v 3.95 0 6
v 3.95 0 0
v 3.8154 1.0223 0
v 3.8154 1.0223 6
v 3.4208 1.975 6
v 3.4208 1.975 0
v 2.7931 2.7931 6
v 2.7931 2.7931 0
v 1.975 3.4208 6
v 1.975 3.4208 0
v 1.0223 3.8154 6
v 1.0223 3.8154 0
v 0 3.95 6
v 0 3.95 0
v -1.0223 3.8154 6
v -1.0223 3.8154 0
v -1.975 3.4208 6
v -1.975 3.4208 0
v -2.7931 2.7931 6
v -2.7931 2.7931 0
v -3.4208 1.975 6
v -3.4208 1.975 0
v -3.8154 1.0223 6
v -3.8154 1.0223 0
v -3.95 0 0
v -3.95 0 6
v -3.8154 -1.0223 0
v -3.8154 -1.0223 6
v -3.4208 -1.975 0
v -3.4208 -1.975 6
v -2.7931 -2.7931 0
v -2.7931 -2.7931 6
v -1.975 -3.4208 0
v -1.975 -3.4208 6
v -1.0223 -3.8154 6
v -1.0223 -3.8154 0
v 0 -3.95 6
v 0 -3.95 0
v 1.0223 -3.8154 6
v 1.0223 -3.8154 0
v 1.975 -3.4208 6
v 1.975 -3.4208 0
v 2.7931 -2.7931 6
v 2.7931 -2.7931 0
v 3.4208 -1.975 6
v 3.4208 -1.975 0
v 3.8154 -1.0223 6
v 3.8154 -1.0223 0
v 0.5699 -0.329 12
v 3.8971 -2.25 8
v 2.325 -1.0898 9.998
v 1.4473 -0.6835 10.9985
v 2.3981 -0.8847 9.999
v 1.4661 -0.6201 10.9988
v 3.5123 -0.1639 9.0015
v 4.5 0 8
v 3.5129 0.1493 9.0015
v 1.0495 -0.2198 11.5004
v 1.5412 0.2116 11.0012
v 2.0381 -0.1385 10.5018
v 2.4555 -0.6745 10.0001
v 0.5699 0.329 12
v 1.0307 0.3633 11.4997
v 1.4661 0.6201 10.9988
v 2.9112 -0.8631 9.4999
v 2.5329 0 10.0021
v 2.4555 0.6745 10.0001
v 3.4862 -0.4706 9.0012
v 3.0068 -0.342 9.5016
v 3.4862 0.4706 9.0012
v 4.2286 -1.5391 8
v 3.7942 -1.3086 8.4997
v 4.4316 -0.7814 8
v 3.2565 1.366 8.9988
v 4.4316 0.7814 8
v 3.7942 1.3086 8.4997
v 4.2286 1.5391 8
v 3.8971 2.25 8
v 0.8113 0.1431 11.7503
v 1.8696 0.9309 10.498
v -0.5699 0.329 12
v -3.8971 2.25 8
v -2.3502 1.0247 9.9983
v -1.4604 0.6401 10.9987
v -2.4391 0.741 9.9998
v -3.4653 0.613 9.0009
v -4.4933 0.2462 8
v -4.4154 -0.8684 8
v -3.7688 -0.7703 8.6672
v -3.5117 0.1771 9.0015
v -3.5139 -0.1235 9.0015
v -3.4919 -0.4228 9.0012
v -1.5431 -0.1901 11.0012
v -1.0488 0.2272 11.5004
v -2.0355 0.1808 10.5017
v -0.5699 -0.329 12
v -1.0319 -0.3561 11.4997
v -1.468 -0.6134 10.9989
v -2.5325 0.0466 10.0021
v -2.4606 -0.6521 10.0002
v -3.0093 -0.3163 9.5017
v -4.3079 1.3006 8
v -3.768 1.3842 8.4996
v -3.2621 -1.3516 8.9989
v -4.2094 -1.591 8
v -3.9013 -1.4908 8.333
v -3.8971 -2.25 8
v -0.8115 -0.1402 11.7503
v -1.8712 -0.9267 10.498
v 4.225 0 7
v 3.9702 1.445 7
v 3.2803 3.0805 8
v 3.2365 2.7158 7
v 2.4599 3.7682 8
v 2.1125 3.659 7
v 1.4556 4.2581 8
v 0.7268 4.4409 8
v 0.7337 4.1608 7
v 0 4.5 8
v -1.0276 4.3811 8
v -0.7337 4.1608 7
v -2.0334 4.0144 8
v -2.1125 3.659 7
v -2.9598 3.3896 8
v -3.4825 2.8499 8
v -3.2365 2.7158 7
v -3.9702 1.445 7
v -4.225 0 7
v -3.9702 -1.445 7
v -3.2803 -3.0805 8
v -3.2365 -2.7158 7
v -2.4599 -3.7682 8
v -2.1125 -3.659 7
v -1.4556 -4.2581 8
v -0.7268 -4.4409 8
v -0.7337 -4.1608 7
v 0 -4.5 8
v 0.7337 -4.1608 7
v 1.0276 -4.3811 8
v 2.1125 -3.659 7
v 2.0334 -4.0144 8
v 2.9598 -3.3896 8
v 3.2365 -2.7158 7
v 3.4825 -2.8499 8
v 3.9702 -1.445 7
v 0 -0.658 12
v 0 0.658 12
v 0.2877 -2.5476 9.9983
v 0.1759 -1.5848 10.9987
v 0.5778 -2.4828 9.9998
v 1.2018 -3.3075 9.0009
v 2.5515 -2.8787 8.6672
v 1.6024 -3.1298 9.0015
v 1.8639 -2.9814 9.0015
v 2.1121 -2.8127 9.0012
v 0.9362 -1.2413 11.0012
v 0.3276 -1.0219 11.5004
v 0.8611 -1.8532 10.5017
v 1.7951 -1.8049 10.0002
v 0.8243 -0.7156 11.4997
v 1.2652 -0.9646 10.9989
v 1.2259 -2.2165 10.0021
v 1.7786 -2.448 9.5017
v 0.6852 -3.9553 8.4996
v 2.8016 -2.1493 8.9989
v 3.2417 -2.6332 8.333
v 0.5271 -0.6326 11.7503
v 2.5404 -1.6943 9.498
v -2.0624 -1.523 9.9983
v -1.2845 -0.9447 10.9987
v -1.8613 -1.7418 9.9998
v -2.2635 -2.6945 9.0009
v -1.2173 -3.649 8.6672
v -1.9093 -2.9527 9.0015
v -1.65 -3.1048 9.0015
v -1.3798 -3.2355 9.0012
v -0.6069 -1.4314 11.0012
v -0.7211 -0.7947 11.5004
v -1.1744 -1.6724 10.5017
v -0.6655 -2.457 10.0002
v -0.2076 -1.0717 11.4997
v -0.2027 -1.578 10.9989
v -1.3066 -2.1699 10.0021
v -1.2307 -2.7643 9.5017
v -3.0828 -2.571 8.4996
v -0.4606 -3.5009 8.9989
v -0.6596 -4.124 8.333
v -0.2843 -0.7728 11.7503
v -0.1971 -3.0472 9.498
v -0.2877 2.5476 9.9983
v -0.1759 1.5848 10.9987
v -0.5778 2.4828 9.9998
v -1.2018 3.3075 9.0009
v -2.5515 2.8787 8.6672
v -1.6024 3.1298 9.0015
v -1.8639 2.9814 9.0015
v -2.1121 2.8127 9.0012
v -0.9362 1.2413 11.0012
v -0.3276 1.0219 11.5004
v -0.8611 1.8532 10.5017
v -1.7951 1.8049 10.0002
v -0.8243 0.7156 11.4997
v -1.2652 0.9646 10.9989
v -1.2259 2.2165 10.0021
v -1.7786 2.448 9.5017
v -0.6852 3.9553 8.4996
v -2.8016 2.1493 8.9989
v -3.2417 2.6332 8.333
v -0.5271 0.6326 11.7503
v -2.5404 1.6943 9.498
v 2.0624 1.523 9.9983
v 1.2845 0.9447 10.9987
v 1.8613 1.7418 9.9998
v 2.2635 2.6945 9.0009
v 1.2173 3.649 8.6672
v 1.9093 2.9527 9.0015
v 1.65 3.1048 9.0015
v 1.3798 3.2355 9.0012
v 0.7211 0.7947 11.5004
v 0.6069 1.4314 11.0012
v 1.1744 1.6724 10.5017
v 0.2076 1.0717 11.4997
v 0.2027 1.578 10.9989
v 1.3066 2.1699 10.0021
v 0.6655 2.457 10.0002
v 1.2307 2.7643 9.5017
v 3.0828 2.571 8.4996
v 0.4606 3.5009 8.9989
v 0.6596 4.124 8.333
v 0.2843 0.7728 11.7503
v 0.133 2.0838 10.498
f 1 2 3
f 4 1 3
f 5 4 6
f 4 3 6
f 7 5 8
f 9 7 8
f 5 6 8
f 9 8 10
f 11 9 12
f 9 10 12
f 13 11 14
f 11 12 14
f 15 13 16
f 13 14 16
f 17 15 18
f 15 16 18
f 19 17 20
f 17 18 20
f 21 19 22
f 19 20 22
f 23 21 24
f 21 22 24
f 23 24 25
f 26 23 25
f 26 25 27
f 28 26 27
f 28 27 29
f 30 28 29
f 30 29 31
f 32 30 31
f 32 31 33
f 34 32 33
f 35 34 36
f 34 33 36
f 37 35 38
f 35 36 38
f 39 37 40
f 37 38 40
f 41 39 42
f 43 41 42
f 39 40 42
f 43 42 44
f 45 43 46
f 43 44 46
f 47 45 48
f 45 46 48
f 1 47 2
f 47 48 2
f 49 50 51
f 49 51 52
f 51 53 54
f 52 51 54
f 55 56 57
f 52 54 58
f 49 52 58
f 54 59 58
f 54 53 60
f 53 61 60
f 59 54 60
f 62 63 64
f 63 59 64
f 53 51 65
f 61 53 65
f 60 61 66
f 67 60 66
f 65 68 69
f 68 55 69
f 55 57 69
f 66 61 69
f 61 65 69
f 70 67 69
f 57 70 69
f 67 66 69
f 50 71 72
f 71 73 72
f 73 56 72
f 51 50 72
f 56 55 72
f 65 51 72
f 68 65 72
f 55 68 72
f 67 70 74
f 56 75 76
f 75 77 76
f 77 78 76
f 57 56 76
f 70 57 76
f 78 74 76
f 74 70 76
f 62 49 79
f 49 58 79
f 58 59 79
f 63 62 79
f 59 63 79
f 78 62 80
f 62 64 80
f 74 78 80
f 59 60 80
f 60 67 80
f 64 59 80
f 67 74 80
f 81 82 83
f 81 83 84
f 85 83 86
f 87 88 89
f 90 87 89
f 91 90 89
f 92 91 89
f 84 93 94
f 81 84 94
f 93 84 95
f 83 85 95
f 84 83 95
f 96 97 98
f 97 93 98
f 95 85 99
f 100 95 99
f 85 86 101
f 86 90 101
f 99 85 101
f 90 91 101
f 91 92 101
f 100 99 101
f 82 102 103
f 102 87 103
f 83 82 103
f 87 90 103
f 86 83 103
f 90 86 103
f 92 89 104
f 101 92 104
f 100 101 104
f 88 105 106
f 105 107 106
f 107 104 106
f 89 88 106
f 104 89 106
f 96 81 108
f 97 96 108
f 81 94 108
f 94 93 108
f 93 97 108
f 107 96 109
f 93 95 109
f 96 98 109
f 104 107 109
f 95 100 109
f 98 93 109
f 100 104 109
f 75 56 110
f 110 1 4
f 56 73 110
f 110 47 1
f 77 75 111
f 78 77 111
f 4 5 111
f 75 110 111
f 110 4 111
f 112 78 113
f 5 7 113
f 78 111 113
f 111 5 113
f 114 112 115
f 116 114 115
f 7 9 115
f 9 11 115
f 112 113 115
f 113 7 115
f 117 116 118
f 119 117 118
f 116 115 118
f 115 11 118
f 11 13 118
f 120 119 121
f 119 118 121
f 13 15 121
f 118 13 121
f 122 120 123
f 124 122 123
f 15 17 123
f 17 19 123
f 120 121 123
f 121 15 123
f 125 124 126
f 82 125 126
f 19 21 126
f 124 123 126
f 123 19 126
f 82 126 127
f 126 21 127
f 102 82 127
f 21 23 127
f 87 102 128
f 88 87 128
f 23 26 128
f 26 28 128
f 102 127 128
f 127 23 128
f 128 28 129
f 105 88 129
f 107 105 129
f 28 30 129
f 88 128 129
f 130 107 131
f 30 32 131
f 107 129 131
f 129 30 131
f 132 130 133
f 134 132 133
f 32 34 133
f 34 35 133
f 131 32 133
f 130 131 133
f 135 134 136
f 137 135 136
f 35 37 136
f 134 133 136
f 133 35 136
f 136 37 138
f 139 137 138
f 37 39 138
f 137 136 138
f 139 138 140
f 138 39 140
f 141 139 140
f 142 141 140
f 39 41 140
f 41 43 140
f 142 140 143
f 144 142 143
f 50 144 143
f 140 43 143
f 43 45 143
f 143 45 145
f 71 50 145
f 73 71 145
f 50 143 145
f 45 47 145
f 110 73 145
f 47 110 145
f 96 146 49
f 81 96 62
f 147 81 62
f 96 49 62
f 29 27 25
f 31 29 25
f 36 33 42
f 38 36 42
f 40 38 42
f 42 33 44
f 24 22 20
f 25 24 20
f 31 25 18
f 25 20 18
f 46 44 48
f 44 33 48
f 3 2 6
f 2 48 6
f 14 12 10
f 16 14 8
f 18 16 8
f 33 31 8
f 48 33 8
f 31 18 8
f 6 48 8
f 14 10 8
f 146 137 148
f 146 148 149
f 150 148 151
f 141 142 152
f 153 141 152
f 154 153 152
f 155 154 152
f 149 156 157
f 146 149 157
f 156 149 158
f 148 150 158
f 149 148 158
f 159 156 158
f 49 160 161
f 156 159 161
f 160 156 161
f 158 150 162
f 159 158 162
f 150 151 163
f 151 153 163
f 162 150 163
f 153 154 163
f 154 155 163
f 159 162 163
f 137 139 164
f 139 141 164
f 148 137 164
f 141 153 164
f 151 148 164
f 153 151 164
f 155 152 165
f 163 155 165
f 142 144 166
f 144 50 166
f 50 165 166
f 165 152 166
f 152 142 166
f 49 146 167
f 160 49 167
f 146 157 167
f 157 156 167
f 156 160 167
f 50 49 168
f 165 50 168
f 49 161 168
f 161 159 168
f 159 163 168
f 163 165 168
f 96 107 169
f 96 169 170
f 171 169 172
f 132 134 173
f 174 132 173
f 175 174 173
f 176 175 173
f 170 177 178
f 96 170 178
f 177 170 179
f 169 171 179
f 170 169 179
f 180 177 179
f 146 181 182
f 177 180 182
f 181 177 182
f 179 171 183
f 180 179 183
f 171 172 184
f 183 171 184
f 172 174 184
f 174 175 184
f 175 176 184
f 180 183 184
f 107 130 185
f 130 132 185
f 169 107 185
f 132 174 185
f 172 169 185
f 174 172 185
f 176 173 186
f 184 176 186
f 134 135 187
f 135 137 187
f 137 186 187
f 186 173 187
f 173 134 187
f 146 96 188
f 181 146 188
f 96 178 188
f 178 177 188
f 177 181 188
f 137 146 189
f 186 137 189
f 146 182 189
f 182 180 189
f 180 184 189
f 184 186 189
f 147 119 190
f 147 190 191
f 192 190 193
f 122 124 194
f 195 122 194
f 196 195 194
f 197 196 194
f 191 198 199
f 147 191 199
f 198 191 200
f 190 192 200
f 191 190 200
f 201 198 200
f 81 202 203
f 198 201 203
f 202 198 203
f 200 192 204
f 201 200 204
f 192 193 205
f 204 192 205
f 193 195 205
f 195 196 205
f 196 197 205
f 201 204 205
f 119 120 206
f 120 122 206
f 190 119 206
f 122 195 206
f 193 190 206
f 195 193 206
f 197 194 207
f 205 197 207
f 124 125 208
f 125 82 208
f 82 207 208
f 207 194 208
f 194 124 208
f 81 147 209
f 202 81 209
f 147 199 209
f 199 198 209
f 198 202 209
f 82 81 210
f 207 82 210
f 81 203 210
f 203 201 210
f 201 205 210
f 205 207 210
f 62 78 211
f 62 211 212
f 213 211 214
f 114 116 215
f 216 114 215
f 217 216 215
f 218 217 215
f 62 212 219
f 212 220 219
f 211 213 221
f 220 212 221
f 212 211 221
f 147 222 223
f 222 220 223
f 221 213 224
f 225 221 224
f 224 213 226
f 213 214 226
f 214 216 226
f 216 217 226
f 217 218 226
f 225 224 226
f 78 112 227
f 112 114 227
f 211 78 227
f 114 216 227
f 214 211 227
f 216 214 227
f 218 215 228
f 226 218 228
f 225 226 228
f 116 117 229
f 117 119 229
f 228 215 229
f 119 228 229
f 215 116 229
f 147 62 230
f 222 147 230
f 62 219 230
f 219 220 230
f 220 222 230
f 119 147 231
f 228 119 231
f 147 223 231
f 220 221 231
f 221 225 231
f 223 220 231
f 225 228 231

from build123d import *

# Parameters (mm, degrees)
SKETCH_1_R      = 3.95
EXTRUDE_1_DEPTH = 6
SKETCH_3_R      = 4.5
SKETCH_2_R      = 3.95


with BuildPart() as part:
    # 스케치1 → 보스-돌출1 (new body)
    with BuildSketch(Plane.XY):
        Circle(SKETCH_1_R)
    extrude(amount=EXTRUDE_1_DEPTH)

    # 스케치3 → 로프트1 section 0
    with BuildSketch(Plane.XY.offset(8)):
        Circle(SKETCH_3_R)
    # 스케치2 → 로프트1 section 1
    with BuildSketch(Plane.XY.offset(6)):
        Circle(SKETCH_2_R)
    loft()

    # 스케치5 → 로프트2 section 0
    with BuildSketch(Plane.XY.offset(12)):
        with BuildLine():
            Line((0, -0.658032332), (0.569872716, -0.329016166))
            Line((0.569872716, -0.329016166), (0.569872716, 0.329016166))
            Line((0.569872716, 0.329016166), (0, 0.658032332))
            Line((0, 0.658032332), (-0.569872716, 0.329016166))
            Line((-0.569872716, 0.329016166), (-0.569872716, -0.329016166))
            Line((-0.569872716, -0.329016166), (0, -0.658032332))
        make_face()
    # 스케치4 for 로프트2 → 로프트2 section 1
    with BuildSketch(Plane.XY.offset(8)):
        with BuildLine():
            # circular arc as an exact rational Bezier (weights 1, cos(half-angle), 1)
            Bezier((0, -4.5), (2.598076211, -4.5), (3.897114317, -2.25), weights=[1, 0.866025404, 1])
            Bezier((3.897114317, -2.25), (5.196152423, 0), (3.897114317, 2.25), weights=[1, 0.866025404, 1])
            Bezier((3.897114317, 2.25), (2.598076211, 4.5), (0, 4.5), weights=[1, 0.866025404, 1])
            Bezier((0, 4.5), (-2.598076211, 4.5), (-3.897114317, 2.25), weights=[1, 0.866025404, 1])
            Bezier((-3.897114317, 2.25), (-5.196152423, 0), (-3.897114317, -2.25), weights=[1, 0.866025404, 1])
            Bezier((-3.897114317, -2.25), (-2.598076211, -4.5), (0, -4.5), weights=[1, 0.866025404, 1])
        make_face()
    loft()


solid = part.part
